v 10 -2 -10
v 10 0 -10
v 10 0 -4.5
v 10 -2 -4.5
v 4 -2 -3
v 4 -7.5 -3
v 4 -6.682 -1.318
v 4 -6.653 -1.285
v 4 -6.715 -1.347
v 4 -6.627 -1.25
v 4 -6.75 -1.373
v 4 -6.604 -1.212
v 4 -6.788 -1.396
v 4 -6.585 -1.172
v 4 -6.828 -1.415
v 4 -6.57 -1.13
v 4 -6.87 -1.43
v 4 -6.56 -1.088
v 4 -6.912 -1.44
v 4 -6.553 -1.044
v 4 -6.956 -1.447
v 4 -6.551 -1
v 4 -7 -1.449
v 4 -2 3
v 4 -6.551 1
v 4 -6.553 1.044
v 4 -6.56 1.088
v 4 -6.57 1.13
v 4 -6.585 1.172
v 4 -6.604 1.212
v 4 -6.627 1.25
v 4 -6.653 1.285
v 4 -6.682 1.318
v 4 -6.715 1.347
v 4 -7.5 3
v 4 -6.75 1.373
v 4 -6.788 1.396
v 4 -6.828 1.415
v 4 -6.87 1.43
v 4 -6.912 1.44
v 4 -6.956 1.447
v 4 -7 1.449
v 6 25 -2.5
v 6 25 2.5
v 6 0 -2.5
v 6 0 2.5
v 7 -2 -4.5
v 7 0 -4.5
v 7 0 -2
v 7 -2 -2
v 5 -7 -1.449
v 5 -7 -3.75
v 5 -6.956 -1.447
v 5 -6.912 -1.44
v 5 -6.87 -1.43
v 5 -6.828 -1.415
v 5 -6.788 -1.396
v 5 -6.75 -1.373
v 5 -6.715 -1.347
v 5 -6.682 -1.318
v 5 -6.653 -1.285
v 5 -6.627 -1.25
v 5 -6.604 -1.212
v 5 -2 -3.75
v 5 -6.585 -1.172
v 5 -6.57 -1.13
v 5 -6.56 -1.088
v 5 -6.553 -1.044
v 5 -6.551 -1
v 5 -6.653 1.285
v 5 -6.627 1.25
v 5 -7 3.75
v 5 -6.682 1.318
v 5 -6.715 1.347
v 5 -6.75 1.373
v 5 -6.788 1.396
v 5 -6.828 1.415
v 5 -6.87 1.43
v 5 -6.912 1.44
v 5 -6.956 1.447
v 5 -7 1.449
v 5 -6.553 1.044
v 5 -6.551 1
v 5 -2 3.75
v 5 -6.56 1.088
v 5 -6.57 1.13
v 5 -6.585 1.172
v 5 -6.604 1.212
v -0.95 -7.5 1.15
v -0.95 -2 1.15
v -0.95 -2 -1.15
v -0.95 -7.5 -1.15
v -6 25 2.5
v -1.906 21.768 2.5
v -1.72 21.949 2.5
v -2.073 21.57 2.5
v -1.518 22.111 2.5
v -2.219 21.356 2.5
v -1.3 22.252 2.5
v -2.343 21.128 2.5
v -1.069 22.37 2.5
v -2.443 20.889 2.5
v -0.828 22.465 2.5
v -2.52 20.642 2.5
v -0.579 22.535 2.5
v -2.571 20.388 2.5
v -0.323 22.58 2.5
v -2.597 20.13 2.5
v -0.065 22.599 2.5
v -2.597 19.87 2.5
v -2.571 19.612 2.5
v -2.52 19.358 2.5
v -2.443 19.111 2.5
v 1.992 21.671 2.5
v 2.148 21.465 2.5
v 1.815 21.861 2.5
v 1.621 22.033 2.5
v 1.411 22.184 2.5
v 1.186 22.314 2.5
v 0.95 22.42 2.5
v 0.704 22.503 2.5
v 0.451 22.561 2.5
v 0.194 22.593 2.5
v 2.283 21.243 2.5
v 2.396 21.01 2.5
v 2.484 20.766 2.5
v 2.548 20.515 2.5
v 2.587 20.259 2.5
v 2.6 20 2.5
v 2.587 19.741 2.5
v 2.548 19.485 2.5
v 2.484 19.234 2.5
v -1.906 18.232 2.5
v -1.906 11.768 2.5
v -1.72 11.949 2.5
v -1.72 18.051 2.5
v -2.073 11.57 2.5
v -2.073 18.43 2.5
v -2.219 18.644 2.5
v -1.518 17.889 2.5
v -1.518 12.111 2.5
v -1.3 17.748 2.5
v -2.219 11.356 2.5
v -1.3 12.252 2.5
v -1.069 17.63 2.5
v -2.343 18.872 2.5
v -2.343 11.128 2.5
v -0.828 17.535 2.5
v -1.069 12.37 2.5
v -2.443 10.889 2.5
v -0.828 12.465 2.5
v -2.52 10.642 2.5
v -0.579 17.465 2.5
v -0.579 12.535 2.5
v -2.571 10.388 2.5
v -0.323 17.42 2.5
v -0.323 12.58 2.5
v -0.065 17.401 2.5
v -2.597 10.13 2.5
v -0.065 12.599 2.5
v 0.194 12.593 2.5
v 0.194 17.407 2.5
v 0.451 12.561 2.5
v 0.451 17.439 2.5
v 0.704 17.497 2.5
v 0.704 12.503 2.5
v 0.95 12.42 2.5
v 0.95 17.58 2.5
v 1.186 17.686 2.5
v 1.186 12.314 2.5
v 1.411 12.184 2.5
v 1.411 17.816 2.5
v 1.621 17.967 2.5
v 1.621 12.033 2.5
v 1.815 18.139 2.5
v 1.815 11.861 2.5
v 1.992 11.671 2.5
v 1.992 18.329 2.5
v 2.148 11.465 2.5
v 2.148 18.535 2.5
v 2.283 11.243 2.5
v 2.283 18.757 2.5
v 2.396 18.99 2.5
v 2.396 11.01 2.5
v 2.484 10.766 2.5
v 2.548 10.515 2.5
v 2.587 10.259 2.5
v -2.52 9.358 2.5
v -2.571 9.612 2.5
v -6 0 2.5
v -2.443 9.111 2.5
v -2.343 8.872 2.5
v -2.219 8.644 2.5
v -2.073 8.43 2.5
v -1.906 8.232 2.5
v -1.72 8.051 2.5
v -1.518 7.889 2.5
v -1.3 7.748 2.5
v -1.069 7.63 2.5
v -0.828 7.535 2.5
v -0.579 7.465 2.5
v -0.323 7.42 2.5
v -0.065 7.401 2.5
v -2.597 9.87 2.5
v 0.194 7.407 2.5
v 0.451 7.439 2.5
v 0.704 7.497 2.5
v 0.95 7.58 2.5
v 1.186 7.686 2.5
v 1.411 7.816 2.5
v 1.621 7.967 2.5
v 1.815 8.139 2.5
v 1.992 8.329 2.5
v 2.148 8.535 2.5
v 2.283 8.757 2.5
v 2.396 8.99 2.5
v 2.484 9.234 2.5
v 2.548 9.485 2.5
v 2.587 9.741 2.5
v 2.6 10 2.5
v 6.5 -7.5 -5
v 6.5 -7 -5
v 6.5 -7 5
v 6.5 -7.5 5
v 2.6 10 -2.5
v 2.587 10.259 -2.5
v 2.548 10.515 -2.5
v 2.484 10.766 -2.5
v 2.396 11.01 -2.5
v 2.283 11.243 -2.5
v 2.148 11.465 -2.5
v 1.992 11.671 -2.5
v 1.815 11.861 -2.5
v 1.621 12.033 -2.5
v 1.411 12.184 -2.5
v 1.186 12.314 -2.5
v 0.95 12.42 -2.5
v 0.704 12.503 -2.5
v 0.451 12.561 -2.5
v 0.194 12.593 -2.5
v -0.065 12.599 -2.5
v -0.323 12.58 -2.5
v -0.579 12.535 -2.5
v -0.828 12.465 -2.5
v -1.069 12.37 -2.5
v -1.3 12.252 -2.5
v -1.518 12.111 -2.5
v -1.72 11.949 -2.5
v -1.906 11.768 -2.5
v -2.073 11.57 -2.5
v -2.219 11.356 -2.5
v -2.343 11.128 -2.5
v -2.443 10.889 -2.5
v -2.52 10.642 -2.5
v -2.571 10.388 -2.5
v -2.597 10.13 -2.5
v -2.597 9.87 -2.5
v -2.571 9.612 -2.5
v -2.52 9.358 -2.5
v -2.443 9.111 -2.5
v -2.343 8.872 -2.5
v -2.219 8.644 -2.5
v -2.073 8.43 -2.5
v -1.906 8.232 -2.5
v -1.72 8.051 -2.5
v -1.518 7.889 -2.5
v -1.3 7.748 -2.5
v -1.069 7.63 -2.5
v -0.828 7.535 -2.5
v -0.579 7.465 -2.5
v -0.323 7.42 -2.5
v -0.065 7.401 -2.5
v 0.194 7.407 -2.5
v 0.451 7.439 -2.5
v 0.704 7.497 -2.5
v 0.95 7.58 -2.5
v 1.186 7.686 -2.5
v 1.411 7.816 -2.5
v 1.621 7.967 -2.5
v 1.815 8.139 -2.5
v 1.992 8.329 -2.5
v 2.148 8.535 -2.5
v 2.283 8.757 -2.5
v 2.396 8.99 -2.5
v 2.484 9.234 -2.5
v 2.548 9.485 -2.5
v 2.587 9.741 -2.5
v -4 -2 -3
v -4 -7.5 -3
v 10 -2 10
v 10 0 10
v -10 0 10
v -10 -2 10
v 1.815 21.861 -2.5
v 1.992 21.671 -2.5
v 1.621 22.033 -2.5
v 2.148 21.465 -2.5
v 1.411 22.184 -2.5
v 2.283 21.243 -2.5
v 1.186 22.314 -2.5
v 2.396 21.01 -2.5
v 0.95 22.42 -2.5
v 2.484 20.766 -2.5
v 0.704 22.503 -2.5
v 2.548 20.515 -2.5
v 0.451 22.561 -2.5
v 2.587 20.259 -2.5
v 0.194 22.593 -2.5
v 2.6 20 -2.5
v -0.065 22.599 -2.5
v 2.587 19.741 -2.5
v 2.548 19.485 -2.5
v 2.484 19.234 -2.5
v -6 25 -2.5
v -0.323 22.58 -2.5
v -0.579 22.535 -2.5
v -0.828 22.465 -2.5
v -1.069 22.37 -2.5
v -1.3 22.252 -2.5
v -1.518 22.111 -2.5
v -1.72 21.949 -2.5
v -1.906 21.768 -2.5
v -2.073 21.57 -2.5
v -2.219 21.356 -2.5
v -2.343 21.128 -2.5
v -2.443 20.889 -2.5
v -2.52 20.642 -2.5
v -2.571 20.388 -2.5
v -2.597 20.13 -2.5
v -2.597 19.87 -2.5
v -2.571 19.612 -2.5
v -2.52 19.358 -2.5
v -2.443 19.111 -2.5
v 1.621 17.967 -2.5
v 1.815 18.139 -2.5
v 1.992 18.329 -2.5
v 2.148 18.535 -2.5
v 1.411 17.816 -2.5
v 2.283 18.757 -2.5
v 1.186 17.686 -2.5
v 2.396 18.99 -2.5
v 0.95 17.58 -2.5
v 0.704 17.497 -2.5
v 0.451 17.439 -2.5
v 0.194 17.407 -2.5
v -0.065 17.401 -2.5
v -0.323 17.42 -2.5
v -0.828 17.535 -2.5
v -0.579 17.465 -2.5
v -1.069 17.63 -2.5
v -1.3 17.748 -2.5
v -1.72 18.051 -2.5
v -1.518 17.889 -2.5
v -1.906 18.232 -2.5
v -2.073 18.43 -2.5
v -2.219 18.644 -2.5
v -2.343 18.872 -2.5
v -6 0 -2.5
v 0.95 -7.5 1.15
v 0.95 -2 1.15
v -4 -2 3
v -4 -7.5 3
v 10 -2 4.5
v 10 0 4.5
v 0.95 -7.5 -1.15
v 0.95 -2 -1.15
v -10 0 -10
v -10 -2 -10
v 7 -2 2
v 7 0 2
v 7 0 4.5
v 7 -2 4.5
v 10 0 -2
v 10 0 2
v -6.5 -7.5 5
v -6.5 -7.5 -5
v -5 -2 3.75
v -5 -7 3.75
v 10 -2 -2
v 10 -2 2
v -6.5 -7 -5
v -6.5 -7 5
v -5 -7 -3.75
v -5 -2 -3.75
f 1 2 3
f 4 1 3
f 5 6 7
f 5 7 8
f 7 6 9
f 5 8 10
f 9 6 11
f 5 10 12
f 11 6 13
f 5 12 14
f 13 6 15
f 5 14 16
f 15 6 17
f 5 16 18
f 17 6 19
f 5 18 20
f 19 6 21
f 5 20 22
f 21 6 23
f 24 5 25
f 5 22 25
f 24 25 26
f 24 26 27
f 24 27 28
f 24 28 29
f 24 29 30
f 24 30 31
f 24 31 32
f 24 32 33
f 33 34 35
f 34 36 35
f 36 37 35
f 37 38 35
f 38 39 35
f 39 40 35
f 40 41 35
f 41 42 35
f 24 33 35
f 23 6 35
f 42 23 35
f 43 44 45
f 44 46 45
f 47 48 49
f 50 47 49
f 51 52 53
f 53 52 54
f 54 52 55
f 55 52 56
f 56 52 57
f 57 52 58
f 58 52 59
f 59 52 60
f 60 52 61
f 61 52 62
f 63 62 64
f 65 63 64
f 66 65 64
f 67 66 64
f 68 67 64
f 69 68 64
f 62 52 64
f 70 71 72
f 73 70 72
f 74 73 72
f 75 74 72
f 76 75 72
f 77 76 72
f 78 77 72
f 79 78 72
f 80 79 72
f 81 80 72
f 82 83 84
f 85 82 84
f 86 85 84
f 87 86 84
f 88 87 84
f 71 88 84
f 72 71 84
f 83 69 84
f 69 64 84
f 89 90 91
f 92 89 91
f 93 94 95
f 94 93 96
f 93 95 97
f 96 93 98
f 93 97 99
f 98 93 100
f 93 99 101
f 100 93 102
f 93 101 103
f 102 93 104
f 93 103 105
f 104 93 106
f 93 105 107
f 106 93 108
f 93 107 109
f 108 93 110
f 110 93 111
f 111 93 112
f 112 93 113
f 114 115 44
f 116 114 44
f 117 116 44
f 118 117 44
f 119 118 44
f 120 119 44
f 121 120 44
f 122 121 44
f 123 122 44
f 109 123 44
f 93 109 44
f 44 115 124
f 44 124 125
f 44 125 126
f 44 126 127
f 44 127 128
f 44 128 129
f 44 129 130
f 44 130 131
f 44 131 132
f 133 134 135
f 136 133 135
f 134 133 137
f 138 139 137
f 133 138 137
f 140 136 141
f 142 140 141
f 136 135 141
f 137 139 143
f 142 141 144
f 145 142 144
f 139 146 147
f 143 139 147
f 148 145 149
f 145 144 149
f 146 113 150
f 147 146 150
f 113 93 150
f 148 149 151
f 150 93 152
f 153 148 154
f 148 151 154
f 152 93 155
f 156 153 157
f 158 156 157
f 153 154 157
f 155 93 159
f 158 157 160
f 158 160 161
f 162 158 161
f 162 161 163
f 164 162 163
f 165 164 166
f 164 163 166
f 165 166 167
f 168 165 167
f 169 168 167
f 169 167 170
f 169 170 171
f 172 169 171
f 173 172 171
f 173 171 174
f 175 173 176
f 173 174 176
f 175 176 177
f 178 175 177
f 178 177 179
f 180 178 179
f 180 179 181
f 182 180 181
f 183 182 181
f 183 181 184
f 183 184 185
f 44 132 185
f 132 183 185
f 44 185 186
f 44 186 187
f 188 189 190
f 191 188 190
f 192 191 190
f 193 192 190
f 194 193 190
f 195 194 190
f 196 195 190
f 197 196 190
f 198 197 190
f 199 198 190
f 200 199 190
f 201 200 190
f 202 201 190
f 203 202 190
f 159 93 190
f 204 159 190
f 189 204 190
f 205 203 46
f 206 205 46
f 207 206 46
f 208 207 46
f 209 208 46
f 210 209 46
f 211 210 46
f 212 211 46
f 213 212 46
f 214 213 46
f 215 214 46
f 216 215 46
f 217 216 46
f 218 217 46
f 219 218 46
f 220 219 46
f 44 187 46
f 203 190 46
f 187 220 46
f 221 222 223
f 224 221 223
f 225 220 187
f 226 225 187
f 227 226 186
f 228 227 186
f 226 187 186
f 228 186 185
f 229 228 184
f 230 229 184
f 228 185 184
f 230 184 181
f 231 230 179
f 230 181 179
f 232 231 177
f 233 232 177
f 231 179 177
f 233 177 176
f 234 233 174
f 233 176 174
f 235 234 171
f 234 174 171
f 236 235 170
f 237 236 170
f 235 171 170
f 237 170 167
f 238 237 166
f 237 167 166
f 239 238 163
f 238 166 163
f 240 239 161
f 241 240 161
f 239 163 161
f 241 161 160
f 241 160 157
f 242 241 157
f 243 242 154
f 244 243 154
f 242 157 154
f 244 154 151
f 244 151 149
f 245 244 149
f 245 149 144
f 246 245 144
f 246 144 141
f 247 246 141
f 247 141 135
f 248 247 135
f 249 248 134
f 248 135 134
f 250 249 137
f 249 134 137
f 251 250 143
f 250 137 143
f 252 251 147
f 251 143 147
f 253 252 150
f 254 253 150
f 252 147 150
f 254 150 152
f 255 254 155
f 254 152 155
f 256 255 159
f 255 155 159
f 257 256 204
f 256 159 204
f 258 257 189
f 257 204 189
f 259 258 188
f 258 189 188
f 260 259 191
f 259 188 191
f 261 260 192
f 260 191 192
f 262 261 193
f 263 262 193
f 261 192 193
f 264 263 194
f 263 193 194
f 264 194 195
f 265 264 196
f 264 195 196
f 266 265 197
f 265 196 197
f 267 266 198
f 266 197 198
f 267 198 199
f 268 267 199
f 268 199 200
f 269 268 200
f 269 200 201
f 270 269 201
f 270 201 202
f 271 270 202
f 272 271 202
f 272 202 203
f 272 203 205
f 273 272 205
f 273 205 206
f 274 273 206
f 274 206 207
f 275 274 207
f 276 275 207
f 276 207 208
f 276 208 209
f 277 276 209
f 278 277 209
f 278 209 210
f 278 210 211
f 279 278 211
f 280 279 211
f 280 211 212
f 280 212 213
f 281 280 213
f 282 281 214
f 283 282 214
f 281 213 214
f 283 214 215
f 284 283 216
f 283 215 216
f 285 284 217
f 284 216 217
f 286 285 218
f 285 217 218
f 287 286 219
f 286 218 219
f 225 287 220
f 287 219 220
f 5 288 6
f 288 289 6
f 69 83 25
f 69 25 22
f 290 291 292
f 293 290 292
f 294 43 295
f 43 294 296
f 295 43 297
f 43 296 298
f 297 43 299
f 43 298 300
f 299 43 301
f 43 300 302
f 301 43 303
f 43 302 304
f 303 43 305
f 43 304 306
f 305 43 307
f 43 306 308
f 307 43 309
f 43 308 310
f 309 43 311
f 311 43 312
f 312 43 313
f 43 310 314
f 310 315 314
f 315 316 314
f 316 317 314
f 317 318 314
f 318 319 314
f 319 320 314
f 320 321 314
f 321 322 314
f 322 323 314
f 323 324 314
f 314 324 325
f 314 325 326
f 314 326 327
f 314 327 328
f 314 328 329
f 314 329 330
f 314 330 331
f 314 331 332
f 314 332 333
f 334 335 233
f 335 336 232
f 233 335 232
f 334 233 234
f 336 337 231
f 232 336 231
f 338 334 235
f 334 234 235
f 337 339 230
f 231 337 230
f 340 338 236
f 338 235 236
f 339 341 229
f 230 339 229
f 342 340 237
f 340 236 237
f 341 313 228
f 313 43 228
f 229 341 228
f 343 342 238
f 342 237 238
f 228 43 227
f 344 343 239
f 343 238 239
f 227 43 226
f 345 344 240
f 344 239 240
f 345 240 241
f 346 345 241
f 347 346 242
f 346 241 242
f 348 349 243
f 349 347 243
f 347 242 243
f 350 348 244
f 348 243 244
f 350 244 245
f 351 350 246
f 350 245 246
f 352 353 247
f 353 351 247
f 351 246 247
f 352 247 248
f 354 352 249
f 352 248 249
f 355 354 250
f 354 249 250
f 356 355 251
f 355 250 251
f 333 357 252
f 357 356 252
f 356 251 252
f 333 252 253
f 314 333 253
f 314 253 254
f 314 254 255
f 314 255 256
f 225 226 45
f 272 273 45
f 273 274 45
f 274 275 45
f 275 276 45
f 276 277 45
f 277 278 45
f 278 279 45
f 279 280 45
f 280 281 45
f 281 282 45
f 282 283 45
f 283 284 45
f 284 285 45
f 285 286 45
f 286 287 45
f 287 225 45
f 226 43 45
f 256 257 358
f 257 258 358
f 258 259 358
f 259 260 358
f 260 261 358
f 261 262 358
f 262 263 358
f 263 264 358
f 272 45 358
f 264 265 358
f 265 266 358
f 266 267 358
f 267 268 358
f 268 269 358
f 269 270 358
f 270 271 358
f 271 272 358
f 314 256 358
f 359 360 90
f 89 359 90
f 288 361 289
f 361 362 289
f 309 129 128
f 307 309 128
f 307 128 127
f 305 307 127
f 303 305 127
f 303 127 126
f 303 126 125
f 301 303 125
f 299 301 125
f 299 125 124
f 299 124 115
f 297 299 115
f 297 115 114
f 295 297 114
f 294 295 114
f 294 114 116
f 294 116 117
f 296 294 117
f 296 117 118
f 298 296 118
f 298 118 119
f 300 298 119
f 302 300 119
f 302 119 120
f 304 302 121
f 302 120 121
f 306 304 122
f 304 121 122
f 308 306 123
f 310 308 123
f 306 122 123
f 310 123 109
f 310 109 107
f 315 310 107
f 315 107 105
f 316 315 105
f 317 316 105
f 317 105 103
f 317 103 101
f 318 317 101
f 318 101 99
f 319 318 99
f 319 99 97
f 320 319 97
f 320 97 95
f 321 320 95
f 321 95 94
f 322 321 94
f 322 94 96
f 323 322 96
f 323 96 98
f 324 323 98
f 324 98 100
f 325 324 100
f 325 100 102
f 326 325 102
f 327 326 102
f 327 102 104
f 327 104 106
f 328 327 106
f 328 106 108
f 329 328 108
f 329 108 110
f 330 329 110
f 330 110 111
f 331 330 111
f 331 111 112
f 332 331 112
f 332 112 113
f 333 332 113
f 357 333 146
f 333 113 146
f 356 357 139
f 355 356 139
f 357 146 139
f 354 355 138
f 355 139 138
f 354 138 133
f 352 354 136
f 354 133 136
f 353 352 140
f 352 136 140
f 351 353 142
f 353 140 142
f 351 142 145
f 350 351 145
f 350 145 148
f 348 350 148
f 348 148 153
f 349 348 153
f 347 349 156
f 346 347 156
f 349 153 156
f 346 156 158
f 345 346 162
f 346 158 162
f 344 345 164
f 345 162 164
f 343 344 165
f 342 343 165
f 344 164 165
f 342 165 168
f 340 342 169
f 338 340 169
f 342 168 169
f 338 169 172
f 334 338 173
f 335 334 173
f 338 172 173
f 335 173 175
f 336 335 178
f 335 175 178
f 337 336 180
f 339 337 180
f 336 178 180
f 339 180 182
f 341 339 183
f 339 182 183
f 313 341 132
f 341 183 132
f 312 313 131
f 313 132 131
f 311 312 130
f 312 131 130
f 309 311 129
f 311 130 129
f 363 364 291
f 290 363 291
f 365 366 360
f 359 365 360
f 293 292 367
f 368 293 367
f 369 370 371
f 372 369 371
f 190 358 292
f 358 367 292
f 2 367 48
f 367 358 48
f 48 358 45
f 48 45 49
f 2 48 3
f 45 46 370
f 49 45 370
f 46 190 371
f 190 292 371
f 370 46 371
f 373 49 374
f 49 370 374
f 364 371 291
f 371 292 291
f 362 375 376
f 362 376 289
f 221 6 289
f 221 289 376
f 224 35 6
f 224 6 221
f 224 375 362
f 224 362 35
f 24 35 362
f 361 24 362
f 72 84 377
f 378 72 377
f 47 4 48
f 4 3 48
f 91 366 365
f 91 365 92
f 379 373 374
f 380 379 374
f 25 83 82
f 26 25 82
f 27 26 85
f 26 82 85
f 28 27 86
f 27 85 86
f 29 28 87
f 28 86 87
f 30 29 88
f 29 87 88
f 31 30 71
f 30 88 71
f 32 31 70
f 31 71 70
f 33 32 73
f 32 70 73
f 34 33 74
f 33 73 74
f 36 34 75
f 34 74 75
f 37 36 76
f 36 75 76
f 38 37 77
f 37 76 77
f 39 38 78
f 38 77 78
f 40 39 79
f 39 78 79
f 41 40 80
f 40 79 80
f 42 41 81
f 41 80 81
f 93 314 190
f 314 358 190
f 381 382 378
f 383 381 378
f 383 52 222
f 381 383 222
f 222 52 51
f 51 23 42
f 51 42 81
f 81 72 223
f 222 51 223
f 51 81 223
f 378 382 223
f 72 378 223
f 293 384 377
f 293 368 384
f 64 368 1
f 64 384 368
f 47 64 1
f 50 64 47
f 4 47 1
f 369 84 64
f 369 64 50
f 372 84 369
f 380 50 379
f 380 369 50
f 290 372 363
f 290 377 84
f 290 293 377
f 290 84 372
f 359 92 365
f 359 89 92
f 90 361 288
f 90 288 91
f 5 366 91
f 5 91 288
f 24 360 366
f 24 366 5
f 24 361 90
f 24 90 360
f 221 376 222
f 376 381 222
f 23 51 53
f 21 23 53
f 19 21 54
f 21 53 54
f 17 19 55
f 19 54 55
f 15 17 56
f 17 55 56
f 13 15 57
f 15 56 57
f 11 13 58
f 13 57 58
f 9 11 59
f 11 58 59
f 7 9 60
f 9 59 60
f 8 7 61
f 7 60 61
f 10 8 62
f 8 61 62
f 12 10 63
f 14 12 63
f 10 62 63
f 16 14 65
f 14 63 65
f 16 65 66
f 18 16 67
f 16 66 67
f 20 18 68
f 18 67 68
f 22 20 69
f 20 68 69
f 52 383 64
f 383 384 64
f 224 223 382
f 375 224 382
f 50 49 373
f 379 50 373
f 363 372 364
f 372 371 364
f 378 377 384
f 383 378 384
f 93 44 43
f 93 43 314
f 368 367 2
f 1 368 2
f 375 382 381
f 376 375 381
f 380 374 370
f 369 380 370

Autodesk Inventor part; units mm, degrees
ref_plane "YZ Plane" through (0, 0, 0) normal (1, 0, 0) x (0, 1, 0)
ref_plane "XZ Plane" through (0, 0, 0) normal (0, 1, 0) x (-1, 0, 0)
ref_plane "XY Plane" through (0, 0, 0) normal (0, 0, 1) x (1, 0, 0)
sketch "草圖1" plane through (0, 0, 0) normal (0, 0, 1) x (1, 0, 0)
  point P0 (0, 0)
sketch "草圖2" plane through (0, 0, 0) normal (0, 1, 0) x (-1, 0, 0)
  line L0 (6, 2.5) -> (-6, 2.5)
  line L1 (-6, 2.5) -> (-6, -2.5)
  line L2 (-6, -2.5) -> (6, -2.5)
  line L3 (6, -2.5) -> (6, 2.5)
  line L4 (6, 2.5) -> (-6, -2.5) construction
  line L5 (-6, 2.5) -> (6, -2.5) construction
  point P0 (0, 0)
  dimension "d0" = 5
  dimension "d1" = 12
extrude "擠出1" add sketch "草圖2" along normal blind 25
sketch "草圖3" plane through (-6, 0, 2.5) normal (0, 0, 1) x (1, 0, 0)
  circle A0 centre (6, 10) radius 2.6
  circle A1 centre (6, 20) radius 2.6
  line L0 (0, 0) -> (12, 0) projected
  point P0 (6, 0)
  point P1 (6, 0)
  dimension "d4" = 5.2
  dimension "d5" = 5.2
  dimension "d6" = 10
  dimension "d7" = 10
extrude "擠出2" cut sketch "草圖3" against normal blind 5.2
sketch "草圖4" plane through (0, 0, 0) normal (0, -1, 0) x (1, 0, 0)
  line L0 (-10, -10) -> (10, -10)
  line L1 (10, -10) -> (10, 10)
  line L2 (10, 10) -> (-10, 10)
  line L3 (-10, 10) -> (-10, -10)
  line L4 (-10, -10) -> (10, 10) construction
  line L5 (10, -10) -> (-10, 10) construction
  point P0 (0, 0)
  dimension "d10" = 20
  dimension "d11" = 20
extrude "擠出3" add sketch "草圖4" along normal blind 2
sketch "草圖5" plane through (0, -2, 0) normal (0, -1, 0) x (1, 0, 0)
  line L0 (-0.95, -1.15) -> (0.95, -1.15)
  line L1 (0.95, -1.15) -> (0.95, 1.15)
  line L2 (0.95, 1.15) -> (-0.95, 1.15)
  line L3 (-0.95, 1.15) -> (-0.95, -1.15)
  line L4 (-0.95, -1.15) -> (0.95, 1.15) construction
  line L5 (0.95, -1.15) -> (-0.95, 1.15) construction
  point P0 (0, 0)
  dimension "d14" = 1.9
  dimension "d15" = 2.3
extrude "擠出4" add sketch "草圖5" along normal blind 5
sketch "草圖6" plane through (0, -2, 0) normal (0, -1, 0) x (1, 0, 0)
  line L0 (-4, -3) -> (4, -3)
  line L1 (4, -3) -> (4, 3)
  line L2 (4, 3) -> (-4, 3)
  line L3 (-4, 3) -> (-4, -3)
  line L4 (-4, -3) -> (4, 3) construction
  line L5 (4, -3) -> (-4, 3) construction
  line L6 (-5, -3.75) -> (5, -3.75)
  line L7 (5, -3.75) -> (5, 3.75)
  line L8 (5, 3.75) -> (-5, 3.75)
  line L9 (-5, 3.75) -> (-5, -3.75)
  line L10 (-5, -3.75) -> (5, 3.75) construction
  line L11 (5, -3.75) -> (-5, 3.75) construction
  point P0 (0, 0)
  dimension "d18" = 6
  dimension "d19" = 8
  dimension "d20" = 10
extrude "擠出5" add sketch "草圖6" along normal blind 5
sketch "草圖7" plane through (5, -2, 3.75) normal (1, 0, 0) x (0, 0, -1)
  line L0 (7.5, -5) -> (0, -5) projected
  line L1 (2.3009, -5) -> (5.1991, -5) construction
  line L2 (2.75, -4.5509) -> (4.75, -4.5509)
  line L3 (4.75, -5.4491) -> (2.75, -5.4491)
  arc A0 (2.75, -4.5509) -> (2.75, -5.4491) centre (2.75, -5) ccw
  arc A1 (4.75, -5.4491) -> (4.75, -4.5509) centre (4.75, -5) ccw
  line L4 (-6.25, 0) -> (13.75, 0) projected
  line L5 (3.75, 0) -> (3.75, -5)
  line L6 (0, 0) -> (0, -5) projected
  point P0 (3.75, 2)
  point P1 (5.1991, -5)
  dimension "d23" = 2
  dimension "d26" = 3.75
extrude "擠出6" cut sketch "草圖7" against normal blind 2 contours L0 L5 L2 A1 | L0 A0 L2 L5
sketch "草圖8" plane through (0, 0, 0) normal (0, 1, 0) x (1, 0, 0)
  line L0 (10, 10) -> (10, -10) projected
  line L1 (7, -4.5) -> (10, -4.5)
  line L2 (10, -4.5) -> (10, -2)
  line L3 (10, -2) -> (7, -2)
  line L4 (7, -2) -> (7, -4.5)
  line L5 (7, 2) -> (10, 2)
  line L6 (10, 2) -> (10, 4.5)
  line L7 (10, 4.5) -> (7, 4.5)
  line L8 (7, 4.5) -> (7, 2)
  point P0 (0, 0)
  point P1 (10, 0)
  point P2 (10, 0)
  dimension "d27" = 3
  dimension "d28" = 2.5
  dimension "d29" = 2.5
  dimension "d30" = 2
  dimension "d31" = 2
extrude "擠出7" cut sketch "草圖8" against normal blind 2
sketch "草圖9" plane through (0, -7, 0) normal (0, -1, 0) x (1, 0, 0)
  line L0 (6.5, 5) -> (-6.5, 5)
  line L1 (-6.5, 5) -> (-6.5, -5)
  line L2 (-6.5, -5) -> (6.5, -5)
  line L3 (6.5, -5) -> (6.5, 5)
  line L4 (6.5, 5) -> (-6.5, -5) construction
  line L5 (-6.5, 5) -> (6.5, -5) construction
  point P0 (0, 0)
  dimension "d34" = 10
  dimension "d35" = 13
extrude "擠出8" add sketch "草圖9" along normal blind 0.5
sketch "草圖10" plane through (0, -7.5, 0) normal (0, -1, 0) x (1, 0, 0)
  line L0 (-4, 3) -> (-4, -3) projected
  line L1 (4, 3) -> (-4, 3)
  line L2 (-4, 3) -> (-4, -3)
  line L3 (-4, -3) -> (4, -3)
  line L4 (4, -3) -> (4, 3)
  line L5 (4, 3) -> (-4, -3) construction
  line L6 (-4, 3) -> (4, -3) construction
  point P0 (0, 0)
extrude "擠出9" cut sketch "草圖10" against normal blind 5
sketch "草圖11" plane through (0, -2.5, 0) normal (0, -1, 0) x (1, 0, 0)
  line L0 (0.95, -1.15) -> (-0.95, -1.15) projected
  line L1 (0.95, 1.15) -> (-0.95, 1.15)
  line L2 (-0.95, 1.15) -> (-0.95, -1.15)
  line L3 (-0.95, -1.15) -> (0.95, -1.15)
  line L4 (0.95, -1.15) -> (0.95, 1.15)
  line L5 (0.95, 1.15) -> (-0.95, -1.15) construction
  line L6 (-0.95, 1.15) -> (0.95, -1.15) construction
  point P0 (0, 0)
extrude "擠出10" add sketch "草圖11" along normal blind 5
equation "\"d8\" = d5"
properties part number "單線圈感測器上"
